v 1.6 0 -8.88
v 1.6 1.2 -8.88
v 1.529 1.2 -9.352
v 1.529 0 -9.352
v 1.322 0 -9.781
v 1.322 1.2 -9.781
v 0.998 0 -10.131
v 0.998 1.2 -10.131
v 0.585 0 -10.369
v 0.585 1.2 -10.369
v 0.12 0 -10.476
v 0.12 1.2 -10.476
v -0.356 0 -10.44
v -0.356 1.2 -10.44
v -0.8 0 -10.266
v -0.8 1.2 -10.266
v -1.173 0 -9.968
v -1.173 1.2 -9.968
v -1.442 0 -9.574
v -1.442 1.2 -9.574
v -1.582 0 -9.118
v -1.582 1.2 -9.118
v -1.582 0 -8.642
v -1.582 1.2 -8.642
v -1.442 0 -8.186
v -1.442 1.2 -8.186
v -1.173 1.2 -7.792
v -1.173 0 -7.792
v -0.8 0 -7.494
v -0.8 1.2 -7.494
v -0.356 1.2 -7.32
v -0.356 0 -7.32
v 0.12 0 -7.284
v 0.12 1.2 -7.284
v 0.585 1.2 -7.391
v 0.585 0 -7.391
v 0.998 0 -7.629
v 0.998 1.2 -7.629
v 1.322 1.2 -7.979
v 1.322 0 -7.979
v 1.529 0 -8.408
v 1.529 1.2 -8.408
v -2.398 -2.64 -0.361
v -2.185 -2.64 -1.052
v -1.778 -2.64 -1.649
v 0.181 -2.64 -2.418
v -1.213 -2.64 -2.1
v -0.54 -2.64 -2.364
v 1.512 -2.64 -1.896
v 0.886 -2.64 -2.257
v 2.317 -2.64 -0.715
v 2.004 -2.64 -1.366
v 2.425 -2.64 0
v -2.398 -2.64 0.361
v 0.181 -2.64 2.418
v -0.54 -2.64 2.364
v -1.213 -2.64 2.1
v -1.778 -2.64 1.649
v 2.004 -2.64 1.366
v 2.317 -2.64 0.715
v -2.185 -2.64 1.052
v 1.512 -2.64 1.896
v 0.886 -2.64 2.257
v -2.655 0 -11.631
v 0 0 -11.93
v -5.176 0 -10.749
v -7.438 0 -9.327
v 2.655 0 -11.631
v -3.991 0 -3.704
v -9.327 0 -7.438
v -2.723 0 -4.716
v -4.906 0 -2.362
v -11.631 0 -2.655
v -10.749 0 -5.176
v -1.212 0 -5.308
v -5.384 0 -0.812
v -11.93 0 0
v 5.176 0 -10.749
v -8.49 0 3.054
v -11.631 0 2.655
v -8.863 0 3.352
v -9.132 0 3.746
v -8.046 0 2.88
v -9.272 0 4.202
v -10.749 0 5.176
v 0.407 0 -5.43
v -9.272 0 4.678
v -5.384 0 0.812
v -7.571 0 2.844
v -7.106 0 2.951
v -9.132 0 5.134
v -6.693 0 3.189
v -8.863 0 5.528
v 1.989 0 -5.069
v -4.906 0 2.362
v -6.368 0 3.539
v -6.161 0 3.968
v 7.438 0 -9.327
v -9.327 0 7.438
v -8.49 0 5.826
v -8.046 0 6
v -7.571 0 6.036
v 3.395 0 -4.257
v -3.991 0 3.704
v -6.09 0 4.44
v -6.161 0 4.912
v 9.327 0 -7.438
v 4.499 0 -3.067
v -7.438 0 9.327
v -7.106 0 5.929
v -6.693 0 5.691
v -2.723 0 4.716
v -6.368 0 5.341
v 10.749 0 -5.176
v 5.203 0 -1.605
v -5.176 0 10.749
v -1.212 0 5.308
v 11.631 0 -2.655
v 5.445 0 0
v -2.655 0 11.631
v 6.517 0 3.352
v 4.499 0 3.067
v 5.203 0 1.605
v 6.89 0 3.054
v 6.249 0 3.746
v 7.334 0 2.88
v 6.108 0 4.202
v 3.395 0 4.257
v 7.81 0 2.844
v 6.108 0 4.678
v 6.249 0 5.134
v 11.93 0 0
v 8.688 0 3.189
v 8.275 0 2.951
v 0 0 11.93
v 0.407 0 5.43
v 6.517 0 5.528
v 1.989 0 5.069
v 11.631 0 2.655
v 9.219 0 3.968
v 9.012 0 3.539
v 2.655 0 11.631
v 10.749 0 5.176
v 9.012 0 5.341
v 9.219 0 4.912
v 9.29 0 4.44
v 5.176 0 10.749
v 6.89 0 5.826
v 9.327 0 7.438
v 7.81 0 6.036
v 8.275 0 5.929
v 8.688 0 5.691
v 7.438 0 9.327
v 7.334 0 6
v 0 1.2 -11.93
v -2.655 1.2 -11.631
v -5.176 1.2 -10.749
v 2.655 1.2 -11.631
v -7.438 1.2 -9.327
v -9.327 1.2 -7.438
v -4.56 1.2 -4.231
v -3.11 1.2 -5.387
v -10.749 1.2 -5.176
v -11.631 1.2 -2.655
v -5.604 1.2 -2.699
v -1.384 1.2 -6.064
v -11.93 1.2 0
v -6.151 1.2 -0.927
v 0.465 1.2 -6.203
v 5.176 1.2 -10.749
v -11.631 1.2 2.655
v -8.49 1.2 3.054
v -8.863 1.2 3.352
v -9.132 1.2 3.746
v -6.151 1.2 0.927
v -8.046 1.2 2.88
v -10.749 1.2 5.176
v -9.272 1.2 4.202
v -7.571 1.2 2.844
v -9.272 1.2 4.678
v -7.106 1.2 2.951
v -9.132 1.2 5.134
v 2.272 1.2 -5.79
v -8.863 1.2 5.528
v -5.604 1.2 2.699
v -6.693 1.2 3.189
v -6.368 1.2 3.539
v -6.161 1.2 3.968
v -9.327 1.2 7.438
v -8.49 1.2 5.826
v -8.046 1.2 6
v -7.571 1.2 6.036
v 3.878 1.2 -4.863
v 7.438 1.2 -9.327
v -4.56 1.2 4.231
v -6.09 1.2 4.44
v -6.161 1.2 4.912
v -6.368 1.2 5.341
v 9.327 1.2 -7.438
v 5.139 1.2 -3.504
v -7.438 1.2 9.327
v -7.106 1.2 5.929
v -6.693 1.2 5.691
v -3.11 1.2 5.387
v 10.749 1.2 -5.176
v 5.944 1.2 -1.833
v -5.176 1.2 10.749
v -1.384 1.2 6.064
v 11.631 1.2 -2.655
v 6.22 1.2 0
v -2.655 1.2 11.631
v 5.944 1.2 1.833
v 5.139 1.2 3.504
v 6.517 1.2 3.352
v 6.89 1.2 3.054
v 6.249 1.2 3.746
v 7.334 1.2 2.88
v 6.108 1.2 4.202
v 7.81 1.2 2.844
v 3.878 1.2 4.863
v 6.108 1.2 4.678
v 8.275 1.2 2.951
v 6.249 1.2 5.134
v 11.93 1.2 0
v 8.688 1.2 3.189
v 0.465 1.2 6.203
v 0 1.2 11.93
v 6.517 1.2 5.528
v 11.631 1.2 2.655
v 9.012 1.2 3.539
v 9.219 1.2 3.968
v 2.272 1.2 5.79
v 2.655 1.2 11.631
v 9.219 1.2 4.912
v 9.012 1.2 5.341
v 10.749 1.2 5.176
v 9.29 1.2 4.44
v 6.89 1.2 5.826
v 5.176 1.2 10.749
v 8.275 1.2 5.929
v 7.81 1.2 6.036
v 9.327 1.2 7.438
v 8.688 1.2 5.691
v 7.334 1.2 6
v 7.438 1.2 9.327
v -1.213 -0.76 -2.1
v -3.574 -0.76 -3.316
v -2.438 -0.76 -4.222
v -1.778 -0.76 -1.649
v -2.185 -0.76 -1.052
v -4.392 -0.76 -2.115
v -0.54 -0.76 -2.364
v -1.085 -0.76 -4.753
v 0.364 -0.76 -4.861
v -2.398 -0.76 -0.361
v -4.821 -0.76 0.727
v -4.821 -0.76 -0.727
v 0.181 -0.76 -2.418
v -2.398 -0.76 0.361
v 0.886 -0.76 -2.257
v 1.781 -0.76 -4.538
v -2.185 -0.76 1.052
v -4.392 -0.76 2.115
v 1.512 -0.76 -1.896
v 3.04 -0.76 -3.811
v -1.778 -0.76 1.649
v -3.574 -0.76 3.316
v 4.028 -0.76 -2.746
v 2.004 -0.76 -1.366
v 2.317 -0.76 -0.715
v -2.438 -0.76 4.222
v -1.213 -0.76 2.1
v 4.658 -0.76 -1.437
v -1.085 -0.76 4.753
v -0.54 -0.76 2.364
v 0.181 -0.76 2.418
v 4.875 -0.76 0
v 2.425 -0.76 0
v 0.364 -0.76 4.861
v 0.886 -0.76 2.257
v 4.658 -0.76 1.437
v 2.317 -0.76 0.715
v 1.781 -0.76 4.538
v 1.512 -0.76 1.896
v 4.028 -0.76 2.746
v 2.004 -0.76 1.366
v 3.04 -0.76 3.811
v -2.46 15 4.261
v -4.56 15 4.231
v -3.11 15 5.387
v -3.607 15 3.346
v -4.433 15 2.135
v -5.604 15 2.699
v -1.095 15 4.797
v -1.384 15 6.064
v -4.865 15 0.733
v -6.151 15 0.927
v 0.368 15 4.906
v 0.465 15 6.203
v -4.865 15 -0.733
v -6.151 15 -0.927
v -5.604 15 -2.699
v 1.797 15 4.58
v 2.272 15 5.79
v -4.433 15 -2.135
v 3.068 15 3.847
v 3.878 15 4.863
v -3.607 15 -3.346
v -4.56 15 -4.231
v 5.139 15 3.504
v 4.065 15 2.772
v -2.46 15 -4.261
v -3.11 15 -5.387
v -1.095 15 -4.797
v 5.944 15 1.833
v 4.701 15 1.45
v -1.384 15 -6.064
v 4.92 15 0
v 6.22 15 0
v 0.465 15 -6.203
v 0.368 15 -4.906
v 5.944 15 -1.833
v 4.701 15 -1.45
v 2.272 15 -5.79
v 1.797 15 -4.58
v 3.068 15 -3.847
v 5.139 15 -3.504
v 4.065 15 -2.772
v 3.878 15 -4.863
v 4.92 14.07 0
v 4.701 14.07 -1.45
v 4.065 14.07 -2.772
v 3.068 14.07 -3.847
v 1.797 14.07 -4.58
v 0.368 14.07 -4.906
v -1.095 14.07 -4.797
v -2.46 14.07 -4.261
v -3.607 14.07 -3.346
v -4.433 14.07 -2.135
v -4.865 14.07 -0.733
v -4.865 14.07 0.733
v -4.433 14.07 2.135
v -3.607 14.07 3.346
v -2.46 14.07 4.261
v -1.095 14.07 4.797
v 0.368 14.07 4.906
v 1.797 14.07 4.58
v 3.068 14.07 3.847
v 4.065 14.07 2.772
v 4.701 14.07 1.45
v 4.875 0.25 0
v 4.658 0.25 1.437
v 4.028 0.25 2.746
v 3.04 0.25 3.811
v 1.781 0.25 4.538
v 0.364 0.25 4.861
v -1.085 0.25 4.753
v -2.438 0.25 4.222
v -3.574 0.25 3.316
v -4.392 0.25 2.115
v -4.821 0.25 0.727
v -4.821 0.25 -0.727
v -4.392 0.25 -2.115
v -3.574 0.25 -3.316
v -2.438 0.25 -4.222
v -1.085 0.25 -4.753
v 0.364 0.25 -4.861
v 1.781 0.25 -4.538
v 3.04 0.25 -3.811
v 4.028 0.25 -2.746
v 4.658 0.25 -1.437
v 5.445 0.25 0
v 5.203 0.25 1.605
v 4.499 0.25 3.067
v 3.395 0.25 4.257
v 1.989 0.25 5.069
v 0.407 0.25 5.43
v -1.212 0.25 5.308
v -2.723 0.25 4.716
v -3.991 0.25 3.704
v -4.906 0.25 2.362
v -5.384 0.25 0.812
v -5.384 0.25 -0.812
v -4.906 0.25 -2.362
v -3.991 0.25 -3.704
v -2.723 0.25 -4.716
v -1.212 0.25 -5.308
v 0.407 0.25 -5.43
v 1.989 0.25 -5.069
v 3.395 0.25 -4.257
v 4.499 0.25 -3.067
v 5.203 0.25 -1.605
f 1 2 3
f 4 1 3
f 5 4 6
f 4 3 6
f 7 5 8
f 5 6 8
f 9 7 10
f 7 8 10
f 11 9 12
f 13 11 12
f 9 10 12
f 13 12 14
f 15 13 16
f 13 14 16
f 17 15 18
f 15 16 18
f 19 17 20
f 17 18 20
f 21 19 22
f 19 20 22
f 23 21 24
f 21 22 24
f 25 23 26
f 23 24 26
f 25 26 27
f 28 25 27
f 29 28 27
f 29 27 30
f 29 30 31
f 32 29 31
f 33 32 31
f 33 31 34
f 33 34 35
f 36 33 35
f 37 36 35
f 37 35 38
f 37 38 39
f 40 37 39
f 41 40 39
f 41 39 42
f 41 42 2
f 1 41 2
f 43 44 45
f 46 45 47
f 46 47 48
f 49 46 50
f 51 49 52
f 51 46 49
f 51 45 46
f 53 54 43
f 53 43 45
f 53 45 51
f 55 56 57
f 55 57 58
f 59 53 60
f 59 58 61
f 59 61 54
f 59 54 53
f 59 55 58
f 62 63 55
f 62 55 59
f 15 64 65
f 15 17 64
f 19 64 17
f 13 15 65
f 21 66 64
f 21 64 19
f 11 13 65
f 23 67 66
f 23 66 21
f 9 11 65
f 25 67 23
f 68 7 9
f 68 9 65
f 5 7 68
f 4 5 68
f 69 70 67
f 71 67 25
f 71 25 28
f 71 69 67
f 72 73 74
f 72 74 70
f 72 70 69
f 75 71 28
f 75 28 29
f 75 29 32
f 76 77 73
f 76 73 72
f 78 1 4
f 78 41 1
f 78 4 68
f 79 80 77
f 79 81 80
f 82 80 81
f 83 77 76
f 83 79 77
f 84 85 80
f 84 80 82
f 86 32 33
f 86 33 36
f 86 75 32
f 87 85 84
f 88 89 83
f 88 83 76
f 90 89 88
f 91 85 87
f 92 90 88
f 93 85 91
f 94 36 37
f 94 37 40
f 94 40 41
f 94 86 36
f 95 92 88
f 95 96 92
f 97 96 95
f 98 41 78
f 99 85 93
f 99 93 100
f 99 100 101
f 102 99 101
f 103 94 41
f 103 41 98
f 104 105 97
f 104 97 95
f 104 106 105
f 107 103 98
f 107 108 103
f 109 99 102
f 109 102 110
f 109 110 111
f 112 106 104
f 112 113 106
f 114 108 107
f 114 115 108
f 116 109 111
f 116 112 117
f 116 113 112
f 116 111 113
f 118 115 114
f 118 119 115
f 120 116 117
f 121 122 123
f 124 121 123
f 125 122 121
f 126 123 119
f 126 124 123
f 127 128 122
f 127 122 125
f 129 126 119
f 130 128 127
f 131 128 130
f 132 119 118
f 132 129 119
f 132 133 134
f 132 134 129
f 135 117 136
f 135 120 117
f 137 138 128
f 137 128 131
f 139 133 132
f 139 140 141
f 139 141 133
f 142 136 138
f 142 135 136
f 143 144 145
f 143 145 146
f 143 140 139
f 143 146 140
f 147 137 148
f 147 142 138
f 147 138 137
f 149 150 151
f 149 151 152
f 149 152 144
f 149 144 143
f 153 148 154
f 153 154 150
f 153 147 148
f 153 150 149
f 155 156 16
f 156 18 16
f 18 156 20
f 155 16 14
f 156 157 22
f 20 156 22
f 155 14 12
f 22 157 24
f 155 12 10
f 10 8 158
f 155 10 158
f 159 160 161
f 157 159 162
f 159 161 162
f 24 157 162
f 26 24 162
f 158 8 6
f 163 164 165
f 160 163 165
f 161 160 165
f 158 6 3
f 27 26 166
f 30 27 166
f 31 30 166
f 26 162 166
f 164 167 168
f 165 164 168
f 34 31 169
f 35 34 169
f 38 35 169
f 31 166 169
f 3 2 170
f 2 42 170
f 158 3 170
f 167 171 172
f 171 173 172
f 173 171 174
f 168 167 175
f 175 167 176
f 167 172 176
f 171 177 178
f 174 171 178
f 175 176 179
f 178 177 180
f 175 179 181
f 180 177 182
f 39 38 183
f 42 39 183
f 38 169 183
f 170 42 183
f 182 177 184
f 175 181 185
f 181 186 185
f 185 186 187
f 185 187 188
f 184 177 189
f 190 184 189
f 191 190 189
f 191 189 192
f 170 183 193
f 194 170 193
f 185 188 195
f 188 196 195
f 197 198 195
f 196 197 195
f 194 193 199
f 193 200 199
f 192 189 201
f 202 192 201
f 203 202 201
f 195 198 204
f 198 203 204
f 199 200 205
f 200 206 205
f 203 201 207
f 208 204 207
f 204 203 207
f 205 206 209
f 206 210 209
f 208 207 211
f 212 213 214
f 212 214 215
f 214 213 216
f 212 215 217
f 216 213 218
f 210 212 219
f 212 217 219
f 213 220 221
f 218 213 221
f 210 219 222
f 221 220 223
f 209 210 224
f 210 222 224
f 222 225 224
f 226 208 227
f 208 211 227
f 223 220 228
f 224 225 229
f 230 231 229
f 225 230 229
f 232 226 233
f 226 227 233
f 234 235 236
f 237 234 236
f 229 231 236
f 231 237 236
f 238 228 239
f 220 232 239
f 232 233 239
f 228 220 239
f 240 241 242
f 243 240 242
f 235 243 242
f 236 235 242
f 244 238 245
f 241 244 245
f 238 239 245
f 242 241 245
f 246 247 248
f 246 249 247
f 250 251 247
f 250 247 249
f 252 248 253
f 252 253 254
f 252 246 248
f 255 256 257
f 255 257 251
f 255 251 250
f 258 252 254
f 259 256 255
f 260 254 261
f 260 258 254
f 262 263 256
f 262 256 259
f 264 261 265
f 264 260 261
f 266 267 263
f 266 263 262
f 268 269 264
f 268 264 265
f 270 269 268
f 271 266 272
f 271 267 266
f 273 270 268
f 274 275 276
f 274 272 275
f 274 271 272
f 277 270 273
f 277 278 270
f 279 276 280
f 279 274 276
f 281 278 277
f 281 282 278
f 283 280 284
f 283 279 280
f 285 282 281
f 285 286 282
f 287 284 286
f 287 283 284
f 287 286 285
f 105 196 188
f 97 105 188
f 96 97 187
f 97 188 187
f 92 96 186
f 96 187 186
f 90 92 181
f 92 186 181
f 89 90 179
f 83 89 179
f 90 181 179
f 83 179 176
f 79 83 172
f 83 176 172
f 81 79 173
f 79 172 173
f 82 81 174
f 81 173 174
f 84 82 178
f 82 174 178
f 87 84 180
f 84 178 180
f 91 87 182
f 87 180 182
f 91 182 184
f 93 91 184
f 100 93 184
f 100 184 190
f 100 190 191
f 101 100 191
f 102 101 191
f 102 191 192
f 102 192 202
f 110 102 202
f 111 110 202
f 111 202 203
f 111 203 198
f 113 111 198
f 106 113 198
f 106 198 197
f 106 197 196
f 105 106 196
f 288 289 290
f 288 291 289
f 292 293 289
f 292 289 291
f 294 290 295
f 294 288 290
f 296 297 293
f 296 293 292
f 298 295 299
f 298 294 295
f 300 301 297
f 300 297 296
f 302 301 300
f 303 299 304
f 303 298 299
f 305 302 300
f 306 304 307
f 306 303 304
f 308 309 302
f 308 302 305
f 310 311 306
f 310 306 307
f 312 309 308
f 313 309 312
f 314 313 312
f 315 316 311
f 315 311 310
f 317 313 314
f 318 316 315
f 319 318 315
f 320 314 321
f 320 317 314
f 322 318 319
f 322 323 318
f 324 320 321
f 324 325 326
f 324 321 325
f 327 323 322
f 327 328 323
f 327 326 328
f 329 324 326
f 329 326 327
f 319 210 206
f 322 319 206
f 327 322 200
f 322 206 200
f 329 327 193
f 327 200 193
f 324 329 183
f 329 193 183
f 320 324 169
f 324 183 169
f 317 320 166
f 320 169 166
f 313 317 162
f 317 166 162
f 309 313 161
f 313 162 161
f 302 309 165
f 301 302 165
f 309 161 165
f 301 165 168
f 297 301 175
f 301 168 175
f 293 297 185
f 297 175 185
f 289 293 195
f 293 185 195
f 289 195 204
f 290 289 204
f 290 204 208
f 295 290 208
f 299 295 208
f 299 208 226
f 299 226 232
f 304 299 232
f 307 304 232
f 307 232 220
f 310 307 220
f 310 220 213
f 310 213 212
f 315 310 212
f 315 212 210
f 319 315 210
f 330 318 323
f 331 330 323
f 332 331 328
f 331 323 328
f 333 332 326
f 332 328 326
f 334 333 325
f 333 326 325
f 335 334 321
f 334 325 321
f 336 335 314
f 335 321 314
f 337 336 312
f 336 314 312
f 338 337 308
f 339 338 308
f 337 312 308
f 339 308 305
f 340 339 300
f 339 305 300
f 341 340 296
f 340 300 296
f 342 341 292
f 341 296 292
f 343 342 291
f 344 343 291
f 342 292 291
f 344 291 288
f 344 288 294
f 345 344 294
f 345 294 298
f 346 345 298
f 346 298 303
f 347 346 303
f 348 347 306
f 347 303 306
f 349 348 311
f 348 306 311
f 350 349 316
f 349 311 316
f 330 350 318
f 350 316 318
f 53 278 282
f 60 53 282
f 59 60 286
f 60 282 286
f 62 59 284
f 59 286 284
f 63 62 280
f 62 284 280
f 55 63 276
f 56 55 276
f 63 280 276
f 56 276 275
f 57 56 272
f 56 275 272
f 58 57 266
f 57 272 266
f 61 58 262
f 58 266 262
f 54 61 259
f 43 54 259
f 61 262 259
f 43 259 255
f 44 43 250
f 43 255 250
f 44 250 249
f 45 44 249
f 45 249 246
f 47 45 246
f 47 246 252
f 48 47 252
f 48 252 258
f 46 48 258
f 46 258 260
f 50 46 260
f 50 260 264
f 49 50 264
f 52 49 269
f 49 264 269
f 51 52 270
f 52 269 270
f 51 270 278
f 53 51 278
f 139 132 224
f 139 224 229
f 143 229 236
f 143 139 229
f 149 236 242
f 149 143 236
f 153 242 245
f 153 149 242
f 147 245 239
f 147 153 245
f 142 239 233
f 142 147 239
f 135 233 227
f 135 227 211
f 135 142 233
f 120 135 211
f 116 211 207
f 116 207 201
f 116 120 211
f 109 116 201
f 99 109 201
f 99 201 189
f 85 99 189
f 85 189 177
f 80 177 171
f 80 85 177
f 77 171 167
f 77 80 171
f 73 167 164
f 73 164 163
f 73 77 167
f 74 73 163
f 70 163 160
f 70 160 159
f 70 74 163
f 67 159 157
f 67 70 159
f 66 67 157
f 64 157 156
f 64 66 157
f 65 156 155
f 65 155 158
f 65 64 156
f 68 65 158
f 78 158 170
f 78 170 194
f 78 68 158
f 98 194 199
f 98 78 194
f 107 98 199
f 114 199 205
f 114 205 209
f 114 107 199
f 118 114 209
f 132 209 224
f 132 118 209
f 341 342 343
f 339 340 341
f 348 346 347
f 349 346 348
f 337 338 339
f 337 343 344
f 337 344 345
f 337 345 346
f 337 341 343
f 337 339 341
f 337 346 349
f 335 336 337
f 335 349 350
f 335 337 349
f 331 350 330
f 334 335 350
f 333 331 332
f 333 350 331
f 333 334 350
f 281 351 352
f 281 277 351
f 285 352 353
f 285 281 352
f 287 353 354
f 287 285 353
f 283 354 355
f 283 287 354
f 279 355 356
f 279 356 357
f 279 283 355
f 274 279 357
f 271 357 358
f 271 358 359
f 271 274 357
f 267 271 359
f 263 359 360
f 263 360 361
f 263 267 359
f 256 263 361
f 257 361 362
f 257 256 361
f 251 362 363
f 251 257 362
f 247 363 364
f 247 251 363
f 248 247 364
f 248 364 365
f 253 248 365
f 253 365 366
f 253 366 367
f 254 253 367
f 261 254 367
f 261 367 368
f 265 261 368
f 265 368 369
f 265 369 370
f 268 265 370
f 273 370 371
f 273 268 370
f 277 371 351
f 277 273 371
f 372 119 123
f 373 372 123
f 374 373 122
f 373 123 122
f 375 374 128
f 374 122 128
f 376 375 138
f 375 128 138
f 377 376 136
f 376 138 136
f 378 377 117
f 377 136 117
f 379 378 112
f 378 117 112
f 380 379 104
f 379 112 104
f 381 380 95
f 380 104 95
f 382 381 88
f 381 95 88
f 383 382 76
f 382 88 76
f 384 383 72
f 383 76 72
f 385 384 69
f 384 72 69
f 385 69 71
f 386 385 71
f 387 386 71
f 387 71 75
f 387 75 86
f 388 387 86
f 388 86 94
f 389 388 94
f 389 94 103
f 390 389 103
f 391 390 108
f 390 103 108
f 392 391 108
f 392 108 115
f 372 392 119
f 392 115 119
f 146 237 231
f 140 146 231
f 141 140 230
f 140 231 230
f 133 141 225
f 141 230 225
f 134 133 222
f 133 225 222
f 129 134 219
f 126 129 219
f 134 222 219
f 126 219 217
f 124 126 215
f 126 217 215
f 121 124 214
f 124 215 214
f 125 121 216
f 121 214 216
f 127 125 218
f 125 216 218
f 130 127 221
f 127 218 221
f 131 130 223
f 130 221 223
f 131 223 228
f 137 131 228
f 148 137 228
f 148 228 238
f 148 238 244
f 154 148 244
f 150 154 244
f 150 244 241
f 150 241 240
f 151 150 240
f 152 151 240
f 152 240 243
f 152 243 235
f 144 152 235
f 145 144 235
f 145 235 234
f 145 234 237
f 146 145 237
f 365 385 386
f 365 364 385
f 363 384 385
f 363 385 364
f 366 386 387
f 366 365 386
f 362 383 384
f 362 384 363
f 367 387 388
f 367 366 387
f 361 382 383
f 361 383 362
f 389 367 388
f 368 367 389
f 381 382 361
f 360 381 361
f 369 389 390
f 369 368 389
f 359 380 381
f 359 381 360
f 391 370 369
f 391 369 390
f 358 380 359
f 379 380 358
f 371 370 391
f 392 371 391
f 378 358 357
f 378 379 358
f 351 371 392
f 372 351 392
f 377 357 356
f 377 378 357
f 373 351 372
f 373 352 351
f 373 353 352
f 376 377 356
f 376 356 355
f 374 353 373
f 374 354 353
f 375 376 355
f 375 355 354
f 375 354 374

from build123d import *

# Parameters (mm, degrees)
SKETCH1_R           = 6.22
BOSS_EXTRUDE1_DEPTH = 15
SKETCH2_R           = 11.93
BOSS_EXTRUDE2_DEPTH = 1.2
CUT_EXTRUDE1_REACH  = 3.2
SKETCH3_R           = 1.6
SKETCH4_R           = 4.92
CUT_EXTRUDE2_DEPTH  = 0.93
SKETCH5_R           = 4.875
BOSS_EXTRUDE3_DEPTH = 0.76
SKETCH6_R           = 2.425
BOSS_EXTRUDE4_DEPTH = 1.88
SKETCH7_R           = 5.445
SKETCH7_R_2         = 4.875
CUT_EXTRUDE3_DEPTH  = 0.25


with BuildPart() as part:
    # Sketch1 → Boss-Extrude1 (new body)
    with BuildSketch(Plane(origin=(0, 0, 0), x_dir=(1, 0, 0), z_dir=(0, 1, 0))):
        Circle(SKETCH1_R)
    extrude(amount=BOSS_EXTRUDE1_DEPTH)

    # Sketch2 → Boss-Extrude2 (add)
    with BuildSketch(Plane.XZ):
        Circle(SKETCH2_R)
    extrude(amount=-BOSS_EXTRUDE2_DEPTH)

    # Sketch3 → Cut-Extrude1 (cut, up to next)
    with BuildSketch(Plane(origin=(0, 1.2, 0), x_dir=(1, 0, 0), z_dir=(0, 1, 0)), mode=Mode.PRIVATE) as cut_extrude1_sk1:
        with Locations((0, 8.88)):
            Circle(SKETCH3_R)
    cut_extrude1_tool1 = extrude(cut_extrude1_sk1.sketch, amount=-CUT_EXTRUDE1_REACH, mode=Mode.PRIVATE) & part.part
    add(cut_extrude1_tool1.solids().sort_by_distance((0, 1.2, -8.88))[0], mode=Mode.SUBTRACT)
    # Sketch3 → Cut-Extrude1 (cut, up to next)
    with BuildSketch(Plane(origin=(0, 1.2, 0), x_dir=(1, 0, 0), z_dir=(0, 1, 0)), mode=Mode.PRIVATE) as cut_extrude1_sk2:
        with Locations((7.690305586, -4.44)):
            Circle(SKETCH3_R)
    cut_extrude1_tool2 = extrude(cut_extrude1_sk2.sketch, amount=-CUT_EXTRUDE1_REACH, mode=Mode.PRIVATE) & part.part
    add(cut_extrude1_tool2.solids().sort_by_distance((7.690306, 1.2, 4.44))[0], mode=Mode.SUBTRACT)
    # Sketch3 → Cut-Extrude1 (cut, up to next)
    with BuildSketch(Plane(origin=(0, 1.2, 0), x_dir=(1, 0, 0), z_dir=(0, 1, 0)), mode=Mode.PRIVATE) as cut_extrude1_sk3:
        with Locations((-7.690305586, -4.44)):
            Circle(SKETCH3_R)
    cut_extrude1_tool3 = extrude(cut_extrude1_sk3.sketch, amount=-CUT_EXTRUDE1_REACH, mode=Mode.PRIVATE) & part.part
    add(cut_extrude1_tool3.solids().sort_by_distance((-7.690306, 1.2, 4.44))[0], mode=Mode.SUBTRACT)

    # Sketch4 → Cut-Extrude2 (cut)
    with BuildSketch(Plane(origin=(0, 15, 0), x_dir=(1, 0, 0), z_dir=(0, 1, 0))):
        Circle(SKETCH4_R)
    extrude(amount=-CUT_EXTRUDE2_DEPTH, mode=Mode.SUBTRACT)

    # Sketch5 → Boss-Extrude3 (add)
    with BuildSketch(Plane.XZ):
        Circle(SKETCH5_R)
    extrude(amount=BOSS_EXTRUDE3_DEPTH)

    # Sketch6 → Boss-Extrude4 (add)
    with BuildSketch(Plane.XZ.offset(0.76)):
        Circle(SKETCH6_R)
    extrude(amount=BOSS_EXTRUDE4_DEPTH)

    # Sketch7 → Cut-Extrude3 (cut)
    with BuildSketch(Plane.XZ):
        Circle(SKETCH7_R)
        Circle(SKETCH7_R_2, mode=Mode.SUBTRACT)
    extrude(amount=-CUT_EXTRUDE3_DEPTH, mode=Mode.SUBTRACT)


solid = part.part
